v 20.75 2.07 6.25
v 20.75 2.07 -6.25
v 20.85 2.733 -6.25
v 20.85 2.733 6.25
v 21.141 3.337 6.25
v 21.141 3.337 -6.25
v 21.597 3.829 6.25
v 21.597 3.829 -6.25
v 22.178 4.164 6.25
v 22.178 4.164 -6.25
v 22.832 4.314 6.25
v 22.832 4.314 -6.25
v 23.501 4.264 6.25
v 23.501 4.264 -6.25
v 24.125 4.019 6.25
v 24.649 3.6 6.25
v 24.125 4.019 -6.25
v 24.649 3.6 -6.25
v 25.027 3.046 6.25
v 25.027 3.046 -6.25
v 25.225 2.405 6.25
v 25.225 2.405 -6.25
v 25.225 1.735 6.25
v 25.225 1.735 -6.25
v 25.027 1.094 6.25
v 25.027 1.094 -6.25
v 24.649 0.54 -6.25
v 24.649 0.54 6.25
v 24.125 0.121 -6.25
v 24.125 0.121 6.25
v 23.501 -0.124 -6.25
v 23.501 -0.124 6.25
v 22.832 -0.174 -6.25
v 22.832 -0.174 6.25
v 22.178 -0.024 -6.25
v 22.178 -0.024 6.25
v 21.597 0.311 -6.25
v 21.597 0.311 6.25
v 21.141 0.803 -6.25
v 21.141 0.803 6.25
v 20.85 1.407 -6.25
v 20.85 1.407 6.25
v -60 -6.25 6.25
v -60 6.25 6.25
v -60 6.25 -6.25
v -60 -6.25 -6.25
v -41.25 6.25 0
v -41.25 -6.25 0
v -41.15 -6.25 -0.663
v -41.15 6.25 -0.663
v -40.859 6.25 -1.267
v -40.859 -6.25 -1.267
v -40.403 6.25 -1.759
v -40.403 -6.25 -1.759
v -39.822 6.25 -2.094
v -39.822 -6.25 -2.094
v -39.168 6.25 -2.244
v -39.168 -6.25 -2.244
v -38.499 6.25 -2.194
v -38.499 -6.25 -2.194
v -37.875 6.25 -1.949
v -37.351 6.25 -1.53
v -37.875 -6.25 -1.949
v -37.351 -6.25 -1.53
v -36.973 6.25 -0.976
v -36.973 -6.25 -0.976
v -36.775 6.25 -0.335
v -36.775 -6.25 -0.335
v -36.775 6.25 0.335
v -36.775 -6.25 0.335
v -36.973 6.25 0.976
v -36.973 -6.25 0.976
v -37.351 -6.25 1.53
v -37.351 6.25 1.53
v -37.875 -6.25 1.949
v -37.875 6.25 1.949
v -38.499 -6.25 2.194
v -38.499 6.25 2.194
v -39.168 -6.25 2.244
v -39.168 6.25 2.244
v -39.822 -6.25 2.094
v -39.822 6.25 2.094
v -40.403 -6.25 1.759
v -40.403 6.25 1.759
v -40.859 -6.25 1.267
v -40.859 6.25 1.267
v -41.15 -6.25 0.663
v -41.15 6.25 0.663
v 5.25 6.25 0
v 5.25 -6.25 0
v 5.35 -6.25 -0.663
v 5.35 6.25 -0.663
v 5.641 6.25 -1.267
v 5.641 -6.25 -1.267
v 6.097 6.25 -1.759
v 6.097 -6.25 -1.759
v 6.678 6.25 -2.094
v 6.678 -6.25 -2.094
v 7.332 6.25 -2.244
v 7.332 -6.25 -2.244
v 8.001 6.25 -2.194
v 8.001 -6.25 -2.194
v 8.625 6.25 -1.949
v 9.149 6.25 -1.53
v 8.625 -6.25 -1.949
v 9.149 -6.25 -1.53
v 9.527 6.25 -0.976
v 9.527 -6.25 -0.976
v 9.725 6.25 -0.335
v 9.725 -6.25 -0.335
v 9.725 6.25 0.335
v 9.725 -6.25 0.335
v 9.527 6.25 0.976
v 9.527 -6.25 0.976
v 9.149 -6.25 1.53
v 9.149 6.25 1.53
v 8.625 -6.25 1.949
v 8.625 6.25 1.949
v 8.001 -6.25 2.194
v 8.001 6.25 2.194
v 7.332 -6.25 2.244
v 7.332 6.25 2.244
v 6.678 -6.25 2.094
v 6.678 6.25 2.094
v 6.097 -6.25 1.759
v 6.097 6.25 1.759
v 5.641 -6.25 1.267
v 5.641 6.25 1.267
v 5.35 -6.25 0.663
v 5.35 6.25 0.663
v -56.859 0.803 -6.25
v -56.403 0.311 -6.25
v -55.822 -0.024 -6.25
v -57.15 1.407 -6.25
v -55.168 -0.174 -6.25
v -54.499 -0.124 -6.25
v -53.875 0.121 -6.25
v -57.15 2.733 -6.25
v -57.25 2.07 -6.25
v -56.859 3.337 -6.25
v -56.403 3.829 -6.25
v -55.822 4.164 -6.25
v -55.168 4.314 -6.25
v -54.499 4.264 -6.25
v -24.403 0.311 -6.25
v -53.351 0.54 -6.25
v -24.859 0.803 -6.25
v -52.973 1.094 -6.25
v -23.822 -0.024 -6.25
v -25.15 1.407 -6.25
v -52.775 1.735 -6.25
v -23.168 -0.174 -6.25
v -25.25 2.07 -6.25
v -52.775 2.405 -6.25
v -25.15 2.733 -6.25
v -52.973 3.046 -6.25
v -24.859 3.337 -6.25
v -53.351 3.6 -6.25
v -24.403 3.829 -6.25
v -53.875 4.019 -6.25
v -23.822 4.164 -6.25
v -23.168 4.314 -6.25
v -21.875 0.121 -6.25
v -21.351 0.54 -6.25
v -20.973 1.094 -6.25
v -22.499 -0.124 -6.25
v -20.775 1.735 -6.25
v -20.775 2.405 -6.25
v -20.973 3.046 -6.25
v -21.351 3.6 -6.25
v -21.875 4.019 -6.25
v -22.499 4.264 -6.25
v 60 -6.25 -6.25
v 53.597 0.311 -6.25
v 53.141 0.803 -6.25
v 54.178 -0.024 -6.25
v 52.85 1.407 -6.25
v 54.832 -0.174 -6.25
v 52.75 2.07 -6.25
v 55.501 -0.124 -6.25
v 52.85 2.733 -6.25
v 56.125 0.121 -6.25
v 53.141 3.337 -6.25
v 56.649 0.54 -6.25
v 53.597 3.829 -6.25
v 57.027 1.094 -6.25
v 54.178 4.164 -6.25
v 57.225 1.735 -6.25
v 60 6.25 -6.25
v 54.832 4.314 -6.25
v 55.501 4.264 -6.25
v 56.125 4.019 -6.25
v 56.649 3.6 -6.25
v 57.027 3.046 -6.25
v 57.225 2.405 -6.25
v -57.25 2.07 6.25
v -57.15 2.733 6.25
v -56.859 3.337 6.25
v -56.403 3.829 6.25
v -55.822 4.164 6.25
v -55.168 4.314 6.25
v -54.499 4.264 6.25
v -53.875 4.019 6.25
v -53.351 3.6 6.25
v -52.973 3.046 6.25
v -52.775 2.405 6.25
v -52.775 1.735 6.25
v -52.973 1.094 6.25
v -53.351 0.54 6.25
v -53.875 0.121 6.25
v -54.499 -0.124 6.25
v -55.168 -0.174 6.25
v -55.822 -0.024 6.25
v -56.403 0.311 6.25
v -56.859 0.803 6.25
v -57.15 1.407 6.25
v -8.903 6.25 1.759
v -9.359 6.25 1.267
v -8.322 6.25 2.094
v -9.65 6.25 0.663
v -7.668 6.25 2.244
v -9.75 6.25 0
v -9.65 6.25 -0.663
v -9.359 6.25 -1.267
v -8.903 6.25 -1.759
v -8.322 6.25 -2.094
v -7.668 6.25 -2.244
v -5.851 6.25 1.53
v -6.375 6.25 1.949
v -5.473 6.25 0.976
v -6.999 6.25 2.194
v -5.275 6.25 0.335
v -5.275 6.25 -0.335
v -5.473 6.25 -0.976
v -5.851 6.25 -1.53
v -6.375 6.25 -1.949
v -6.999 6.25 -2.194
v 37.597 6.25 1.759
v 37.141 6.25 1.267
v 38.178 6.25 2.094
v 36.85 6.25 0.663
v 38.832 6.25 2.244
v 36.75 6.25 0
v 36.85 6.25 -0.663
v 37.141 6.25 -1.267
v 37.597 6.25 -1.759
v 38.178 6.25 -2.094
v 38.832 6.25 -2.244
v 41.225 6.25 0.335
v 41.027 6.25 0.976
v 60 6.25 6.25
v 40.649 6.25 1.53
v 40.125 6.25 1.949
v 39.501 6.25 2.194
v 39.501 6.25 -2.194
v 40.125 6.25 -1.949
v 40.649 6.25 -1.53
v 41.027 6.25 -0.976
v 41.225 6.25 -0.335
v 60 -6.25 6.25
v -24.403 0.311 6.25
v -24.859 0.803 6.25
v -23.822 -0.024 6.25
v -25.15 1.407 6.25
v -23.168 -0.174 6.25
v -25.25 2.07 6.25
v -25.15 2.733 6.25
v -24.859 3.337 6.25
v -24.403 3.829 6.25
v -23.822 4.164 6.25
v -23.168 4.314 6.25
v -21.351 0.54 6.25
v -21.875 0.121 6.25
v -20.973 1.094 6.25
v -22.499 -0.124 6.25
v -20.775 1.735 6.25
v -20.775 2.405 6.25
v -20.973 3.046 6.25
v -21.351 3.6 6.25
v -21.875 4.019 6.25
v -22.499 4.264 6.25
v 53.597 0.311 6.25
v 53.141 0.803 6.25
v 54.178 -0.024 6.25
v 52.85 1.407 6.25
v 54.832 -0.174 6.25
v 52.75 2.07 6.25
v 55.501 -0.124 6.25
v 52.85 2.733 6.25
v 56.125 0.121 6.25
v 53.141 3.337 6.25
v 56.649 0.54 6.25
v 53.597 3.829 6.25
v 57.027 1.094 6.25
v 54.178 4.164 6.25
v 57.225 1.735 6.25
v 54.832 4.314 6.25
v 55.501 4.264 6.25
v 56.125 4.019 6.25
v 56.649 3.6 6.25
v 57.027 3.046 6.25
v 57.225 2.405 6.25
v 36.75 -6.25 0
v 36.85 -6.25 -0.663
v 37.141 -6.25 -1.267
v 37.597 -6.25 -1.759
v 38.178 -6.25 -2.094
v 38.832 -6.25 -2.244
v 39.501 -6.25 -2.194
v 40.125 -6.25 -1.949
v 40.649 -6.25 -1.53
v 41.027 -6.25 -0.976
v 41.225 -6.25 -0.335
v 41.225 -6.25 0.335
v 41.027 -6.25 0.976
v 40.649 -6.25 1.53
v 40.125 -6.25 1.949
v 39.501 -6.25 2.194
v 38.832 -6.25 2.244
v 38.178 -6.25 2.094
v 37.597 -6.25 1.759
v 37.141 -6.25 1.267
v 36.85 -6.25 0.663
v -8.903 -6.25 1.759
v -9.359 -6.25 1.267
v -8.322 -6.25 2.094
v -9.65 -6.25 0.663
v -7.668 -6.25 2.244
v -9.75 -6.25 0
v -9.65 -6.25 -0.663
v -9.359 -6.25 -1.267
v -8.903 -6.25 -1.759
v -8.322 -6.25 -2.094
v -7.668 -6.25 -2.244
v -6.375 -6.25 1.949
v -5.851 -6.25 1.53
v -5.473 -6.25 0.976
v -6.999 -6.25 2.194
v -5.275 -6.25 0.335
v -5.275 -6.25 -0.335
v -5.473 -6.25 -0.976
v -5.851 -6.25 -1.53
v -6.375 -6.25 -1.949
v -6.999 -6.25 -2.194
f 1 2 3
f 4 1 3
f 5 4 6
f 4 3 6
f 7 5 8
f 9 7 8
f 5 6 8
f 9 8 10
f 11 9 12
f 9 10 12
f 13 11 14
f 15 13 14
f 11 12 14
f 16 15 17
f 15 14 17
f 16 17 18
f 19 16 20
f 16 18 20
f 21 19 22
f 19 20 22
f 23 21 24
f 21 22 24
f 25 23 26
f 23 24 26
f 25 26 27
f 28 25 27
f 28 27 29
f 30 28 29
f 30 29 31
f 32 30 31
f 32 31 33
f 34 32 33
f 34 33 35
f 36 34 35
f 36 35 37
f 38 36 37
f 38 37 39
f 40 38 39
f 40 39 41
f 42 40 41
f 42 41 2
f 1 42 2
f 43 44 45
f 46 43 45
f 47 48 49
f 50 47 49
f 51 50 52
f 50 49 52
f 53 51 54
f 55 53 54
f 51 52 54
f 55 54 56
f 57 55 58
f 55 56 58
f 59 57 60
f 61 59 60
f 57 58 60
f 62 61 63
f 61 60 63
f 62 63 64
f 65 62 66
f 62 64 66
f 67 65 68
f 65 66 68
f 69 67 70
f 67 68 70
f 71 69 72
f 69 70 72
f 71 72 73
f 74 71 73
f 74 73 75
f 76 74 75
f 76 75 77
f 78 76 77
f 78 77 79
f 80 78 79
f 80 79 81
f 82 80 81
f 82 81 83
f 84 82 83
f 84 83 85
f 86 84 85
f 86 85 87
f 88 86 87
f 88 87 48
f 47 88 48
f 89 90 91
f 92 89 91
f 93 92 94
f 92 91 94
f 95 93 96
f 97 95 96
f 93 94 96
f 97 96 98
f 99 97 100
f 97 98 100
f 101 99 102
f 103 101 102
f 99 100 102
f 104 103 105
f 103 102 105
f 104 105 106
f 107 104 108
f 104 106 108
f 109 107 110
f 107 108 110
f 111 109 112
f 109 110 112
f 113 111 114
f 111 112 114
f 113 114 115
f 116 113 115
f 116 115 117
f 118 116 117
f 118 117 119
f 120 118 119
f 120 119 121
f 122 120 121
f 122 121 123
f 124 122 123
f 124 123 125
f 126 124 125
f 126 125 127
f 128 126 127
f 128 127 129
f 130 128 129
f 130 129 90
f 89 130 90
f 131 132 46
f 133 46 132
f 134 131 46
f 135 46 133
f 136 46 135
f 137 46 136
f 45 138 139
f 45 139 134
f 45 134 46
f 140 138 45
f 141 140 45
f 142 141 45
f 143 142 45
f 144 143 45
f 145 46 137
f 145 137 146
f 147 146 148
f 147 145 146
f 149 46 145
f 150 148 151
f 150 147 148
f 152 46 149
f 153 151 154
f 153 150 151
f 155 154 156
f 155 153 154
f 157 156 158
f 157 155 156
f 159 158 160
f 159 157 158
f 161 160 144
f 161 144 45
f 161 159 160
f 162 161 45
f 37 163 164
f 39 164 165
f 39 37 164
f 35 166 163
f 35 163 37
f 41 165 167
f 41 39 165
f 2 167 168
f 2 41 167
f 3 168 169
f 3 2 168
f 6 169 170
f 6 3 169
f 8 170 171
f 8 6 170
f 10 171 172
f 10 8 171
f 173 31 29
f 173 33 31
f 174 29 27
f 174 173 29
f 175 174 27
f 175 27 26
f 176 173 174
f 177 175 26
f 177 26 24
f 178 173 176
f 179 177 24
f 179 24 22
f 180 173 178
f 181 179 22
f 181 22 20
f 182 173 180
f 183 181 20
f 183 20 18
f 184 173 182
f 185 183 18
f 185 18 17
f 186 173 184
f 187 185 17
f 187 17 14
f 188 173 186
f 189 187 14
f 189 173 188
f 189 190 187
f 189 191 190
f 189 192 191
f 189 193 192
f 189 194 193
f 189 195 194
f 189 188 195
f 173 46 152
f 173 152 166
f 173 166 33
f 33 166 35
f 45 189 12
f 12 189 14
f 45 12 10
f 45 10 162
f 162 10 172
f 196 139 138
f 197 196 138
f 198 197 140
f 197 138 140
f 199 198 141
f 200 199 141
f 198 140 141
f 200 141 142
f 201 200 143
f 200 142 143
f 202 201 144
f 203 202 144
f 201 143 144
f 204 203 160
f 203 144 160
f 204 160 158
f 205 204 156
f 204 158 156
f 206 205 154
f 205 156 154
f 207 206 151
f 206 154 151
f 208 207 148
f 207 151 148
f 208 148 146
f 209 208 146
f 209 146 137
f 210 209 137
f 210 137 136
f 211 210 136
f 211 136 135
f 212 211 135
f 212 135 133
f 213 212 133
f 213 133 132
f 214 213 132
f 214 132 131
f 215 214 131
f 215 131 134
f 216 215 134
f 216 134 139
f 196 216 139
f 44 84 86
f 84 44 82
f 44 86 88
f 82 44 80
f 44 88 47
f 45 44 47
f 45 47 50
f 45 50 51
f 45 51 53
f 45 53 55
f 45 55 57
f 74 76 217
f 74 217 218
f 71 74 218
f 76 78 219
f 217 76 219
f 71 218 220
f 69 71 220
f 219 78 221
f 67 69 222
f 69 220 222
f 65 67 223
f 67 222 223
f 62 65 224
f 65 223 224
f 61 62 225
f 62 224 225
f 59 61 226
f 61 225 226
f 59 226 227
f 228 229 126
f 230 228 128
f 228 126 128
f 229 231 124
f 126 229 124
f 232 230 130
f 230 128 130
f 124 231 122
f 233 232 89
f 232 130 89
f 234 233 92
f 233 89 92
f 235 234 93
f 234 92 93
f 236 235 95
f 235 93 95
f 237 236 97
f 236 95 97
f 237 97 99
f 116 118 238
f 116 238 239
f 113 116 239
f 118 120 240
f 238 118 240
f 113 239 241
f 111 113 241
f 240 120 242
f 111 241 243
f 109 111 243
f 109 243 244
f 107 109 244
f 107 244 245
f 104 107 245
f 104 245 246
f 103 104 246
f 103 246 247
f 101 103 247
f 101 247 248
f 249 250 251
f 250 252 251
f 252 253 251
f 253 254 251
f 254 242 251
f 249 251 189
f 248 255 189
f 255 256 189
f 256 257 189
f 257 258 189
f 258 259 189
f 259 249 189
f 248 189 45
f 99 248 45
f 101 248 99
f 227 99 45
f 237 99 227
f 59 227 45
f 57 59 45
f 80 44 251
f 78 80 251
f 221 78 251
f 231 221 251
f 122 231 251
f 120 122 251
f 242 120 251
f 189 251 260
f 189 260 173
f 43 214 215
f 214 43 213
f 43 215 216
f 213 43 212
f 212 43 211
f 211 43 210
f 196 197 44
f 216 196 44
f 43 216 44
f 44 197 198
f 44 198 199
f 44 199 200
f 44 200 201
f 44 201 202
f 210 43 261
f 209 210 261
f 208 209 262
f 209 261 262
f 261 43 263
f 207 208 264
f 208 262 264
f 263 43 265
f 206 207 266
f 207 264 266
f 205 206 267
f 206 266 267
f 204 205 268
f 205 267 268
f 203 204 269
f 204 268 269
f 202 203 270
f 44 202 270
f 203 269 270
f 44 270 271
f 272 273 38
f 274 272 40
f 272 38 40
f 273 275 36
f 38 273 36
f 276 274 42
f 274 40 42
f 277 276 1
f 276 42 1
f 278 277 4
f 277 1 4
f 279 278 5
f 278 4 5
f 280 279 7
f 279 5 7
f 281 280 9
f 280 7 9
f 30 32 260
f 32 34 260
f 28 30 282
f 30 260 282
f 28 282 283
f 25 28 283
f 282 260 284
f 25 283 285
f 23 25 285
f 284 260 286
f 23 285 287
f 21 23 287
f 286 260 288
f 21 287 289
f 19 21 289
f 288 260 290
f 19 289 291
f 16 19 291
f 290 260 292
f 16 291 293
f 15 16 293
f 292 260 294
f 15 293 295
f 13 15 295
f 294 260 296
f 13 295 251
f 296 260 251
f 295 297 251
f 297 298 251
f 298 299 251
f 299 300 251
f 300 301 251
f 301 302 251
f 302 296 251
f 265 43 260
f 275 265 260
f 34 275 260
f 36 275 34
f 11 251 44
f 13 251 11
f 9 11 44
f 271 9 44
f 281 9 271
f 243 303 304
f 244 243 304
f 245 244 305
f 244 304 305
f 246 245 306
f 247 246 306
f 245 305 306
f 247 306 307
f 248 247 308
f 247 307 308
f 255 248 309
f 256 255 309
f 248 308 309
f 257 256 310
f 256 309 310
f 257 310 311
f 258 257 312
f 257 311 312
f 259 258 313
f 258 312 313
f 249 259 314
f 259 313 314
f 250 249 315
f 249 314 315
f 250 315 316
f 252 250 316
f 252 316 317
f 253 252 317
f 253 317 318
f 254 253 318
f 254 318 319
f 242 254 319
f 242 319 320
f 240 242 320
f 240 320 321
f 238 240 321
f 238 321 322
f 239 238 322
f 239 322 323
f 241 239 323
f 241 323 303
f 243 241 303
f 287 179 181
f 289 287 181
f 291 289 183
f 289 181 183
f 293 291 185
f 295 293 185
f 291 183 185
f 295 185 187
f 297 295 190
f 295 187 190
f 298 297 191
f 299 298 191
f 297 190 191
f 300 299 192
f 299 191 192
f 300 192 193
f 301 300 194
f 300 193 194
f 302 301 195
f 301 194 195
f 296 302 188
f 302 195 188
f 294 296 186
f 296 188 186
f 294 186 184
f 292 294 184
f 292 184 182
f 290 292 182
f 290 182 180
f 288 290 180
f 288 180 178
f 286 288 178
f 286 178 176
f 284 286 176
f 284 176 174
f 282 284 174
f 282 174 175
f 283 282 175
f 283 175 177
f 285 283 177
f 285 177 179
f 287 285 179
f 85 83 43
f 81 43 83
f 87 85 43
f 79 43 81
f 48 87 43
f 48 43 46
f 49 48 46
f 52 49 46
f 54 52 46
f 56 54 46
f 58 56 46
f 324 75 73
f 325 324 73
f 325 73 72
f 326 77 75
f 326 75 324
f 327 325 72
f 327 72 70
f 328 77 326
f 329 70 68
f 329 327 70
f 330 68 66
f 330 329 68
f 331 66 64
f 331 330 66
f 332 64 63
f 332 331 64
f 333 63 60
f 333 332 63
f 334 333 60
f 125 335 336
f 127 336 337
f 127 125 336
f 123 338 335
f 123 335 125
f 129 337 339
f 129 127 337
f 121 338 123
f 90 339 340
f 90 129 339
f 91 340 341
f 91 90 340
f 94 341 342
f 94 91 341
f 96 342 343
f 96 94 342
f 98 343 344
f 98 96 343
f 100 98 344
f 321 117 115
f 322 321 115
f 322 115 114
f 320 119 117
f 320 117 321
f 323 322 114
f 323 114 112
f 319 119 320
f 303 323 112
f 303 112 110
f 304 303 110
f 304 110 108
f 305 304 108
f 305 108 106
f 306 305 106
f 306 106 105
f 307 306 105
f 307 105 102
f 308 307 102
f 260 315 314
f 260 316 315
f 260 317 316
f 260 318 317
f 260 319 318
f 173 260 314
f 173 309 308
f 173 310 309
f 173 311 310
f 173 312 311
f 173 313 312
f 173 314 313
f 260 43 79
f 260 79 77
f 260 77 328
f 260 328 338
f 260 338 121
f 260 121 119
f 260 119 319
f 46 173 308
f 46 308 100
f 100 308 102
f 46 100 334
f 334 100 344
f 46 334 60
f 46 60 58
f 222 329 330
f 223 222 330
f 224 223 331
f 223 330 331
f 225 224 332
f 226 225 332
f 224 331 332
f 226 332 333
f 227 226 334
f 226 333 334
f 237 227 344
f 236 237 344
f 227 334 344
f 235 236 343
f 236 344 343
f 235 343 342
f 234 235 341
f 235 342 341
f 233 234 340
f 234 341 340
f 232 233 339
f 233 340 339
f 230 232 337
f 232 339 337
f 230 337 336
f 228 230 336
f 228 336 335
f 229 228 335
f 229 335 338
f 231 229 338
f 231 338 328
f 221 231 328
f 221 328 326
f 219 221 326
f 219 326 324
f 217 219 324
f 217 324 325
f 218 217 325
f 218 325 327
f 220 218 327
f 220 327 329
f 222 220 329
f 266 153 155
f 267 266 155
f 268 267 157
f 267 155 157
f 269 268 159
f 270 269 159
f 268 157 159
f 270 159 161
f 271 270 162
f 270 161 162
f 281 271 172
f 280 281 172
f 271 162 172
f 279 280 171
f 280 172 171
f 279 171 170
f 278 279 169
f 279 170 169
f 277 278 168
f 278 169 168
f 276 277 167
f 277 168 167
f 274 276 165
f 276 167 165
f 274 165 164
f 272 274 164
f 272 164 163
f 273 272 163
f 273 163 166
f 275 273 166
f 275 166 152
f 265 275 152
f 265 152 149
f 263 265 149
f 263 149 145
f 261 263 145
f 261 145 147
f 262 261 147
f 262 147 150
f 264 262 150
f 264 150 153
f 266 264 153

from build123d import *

# Parameters (mm, degrees)
SKETCH1_W             = 12.5
SKETCH1_H             = 12.5
BOSS_EXTRUDE1_DEPTH   = 60
F_4_0MM_DOWEL_HOLE1_D = 4.5
F_1_0MM_DOWEL_HOLE1_D = 4.5


with BuildPart() as part:
    # Sketch1 → Boss-Extrude1 (new body, symmetric)
    with BuildSketch(Plane(origin=(0, 0, 0), x_dir=(0, 0, -1), z_dir=(1, 0, 0))):
        Rectangle(SKETCH1_W, SKETCH1_H)
    extrude(amount=BOSS_EXTRUDE1_DEPTH, both=True)

    # Ø4.0mm Dowel Hole1 (through all)
    with Locations(Plane.XY.offset(6.25)):
        with Locations((-55, 2.07), (-23, 2.07), (23, 2.07), (55, 2.07)):
            Hole(F_4_0MM_DOWEL_HOLE1_D / 2)

    # Ø1.0mm Dowel Hole1 (through all)
    with Locations(Plane(origin=(0, 6.25, 0), x_dir=(1, 0, 0), z_dir=(0, 1, 0))):
        with Locations((-39, 0), (39, 0), (-7.5, 0), (7.5, 0)):
            Hole(F_1_0MM_DOWEL_HOLE1_D / 2)


solid = part.part
